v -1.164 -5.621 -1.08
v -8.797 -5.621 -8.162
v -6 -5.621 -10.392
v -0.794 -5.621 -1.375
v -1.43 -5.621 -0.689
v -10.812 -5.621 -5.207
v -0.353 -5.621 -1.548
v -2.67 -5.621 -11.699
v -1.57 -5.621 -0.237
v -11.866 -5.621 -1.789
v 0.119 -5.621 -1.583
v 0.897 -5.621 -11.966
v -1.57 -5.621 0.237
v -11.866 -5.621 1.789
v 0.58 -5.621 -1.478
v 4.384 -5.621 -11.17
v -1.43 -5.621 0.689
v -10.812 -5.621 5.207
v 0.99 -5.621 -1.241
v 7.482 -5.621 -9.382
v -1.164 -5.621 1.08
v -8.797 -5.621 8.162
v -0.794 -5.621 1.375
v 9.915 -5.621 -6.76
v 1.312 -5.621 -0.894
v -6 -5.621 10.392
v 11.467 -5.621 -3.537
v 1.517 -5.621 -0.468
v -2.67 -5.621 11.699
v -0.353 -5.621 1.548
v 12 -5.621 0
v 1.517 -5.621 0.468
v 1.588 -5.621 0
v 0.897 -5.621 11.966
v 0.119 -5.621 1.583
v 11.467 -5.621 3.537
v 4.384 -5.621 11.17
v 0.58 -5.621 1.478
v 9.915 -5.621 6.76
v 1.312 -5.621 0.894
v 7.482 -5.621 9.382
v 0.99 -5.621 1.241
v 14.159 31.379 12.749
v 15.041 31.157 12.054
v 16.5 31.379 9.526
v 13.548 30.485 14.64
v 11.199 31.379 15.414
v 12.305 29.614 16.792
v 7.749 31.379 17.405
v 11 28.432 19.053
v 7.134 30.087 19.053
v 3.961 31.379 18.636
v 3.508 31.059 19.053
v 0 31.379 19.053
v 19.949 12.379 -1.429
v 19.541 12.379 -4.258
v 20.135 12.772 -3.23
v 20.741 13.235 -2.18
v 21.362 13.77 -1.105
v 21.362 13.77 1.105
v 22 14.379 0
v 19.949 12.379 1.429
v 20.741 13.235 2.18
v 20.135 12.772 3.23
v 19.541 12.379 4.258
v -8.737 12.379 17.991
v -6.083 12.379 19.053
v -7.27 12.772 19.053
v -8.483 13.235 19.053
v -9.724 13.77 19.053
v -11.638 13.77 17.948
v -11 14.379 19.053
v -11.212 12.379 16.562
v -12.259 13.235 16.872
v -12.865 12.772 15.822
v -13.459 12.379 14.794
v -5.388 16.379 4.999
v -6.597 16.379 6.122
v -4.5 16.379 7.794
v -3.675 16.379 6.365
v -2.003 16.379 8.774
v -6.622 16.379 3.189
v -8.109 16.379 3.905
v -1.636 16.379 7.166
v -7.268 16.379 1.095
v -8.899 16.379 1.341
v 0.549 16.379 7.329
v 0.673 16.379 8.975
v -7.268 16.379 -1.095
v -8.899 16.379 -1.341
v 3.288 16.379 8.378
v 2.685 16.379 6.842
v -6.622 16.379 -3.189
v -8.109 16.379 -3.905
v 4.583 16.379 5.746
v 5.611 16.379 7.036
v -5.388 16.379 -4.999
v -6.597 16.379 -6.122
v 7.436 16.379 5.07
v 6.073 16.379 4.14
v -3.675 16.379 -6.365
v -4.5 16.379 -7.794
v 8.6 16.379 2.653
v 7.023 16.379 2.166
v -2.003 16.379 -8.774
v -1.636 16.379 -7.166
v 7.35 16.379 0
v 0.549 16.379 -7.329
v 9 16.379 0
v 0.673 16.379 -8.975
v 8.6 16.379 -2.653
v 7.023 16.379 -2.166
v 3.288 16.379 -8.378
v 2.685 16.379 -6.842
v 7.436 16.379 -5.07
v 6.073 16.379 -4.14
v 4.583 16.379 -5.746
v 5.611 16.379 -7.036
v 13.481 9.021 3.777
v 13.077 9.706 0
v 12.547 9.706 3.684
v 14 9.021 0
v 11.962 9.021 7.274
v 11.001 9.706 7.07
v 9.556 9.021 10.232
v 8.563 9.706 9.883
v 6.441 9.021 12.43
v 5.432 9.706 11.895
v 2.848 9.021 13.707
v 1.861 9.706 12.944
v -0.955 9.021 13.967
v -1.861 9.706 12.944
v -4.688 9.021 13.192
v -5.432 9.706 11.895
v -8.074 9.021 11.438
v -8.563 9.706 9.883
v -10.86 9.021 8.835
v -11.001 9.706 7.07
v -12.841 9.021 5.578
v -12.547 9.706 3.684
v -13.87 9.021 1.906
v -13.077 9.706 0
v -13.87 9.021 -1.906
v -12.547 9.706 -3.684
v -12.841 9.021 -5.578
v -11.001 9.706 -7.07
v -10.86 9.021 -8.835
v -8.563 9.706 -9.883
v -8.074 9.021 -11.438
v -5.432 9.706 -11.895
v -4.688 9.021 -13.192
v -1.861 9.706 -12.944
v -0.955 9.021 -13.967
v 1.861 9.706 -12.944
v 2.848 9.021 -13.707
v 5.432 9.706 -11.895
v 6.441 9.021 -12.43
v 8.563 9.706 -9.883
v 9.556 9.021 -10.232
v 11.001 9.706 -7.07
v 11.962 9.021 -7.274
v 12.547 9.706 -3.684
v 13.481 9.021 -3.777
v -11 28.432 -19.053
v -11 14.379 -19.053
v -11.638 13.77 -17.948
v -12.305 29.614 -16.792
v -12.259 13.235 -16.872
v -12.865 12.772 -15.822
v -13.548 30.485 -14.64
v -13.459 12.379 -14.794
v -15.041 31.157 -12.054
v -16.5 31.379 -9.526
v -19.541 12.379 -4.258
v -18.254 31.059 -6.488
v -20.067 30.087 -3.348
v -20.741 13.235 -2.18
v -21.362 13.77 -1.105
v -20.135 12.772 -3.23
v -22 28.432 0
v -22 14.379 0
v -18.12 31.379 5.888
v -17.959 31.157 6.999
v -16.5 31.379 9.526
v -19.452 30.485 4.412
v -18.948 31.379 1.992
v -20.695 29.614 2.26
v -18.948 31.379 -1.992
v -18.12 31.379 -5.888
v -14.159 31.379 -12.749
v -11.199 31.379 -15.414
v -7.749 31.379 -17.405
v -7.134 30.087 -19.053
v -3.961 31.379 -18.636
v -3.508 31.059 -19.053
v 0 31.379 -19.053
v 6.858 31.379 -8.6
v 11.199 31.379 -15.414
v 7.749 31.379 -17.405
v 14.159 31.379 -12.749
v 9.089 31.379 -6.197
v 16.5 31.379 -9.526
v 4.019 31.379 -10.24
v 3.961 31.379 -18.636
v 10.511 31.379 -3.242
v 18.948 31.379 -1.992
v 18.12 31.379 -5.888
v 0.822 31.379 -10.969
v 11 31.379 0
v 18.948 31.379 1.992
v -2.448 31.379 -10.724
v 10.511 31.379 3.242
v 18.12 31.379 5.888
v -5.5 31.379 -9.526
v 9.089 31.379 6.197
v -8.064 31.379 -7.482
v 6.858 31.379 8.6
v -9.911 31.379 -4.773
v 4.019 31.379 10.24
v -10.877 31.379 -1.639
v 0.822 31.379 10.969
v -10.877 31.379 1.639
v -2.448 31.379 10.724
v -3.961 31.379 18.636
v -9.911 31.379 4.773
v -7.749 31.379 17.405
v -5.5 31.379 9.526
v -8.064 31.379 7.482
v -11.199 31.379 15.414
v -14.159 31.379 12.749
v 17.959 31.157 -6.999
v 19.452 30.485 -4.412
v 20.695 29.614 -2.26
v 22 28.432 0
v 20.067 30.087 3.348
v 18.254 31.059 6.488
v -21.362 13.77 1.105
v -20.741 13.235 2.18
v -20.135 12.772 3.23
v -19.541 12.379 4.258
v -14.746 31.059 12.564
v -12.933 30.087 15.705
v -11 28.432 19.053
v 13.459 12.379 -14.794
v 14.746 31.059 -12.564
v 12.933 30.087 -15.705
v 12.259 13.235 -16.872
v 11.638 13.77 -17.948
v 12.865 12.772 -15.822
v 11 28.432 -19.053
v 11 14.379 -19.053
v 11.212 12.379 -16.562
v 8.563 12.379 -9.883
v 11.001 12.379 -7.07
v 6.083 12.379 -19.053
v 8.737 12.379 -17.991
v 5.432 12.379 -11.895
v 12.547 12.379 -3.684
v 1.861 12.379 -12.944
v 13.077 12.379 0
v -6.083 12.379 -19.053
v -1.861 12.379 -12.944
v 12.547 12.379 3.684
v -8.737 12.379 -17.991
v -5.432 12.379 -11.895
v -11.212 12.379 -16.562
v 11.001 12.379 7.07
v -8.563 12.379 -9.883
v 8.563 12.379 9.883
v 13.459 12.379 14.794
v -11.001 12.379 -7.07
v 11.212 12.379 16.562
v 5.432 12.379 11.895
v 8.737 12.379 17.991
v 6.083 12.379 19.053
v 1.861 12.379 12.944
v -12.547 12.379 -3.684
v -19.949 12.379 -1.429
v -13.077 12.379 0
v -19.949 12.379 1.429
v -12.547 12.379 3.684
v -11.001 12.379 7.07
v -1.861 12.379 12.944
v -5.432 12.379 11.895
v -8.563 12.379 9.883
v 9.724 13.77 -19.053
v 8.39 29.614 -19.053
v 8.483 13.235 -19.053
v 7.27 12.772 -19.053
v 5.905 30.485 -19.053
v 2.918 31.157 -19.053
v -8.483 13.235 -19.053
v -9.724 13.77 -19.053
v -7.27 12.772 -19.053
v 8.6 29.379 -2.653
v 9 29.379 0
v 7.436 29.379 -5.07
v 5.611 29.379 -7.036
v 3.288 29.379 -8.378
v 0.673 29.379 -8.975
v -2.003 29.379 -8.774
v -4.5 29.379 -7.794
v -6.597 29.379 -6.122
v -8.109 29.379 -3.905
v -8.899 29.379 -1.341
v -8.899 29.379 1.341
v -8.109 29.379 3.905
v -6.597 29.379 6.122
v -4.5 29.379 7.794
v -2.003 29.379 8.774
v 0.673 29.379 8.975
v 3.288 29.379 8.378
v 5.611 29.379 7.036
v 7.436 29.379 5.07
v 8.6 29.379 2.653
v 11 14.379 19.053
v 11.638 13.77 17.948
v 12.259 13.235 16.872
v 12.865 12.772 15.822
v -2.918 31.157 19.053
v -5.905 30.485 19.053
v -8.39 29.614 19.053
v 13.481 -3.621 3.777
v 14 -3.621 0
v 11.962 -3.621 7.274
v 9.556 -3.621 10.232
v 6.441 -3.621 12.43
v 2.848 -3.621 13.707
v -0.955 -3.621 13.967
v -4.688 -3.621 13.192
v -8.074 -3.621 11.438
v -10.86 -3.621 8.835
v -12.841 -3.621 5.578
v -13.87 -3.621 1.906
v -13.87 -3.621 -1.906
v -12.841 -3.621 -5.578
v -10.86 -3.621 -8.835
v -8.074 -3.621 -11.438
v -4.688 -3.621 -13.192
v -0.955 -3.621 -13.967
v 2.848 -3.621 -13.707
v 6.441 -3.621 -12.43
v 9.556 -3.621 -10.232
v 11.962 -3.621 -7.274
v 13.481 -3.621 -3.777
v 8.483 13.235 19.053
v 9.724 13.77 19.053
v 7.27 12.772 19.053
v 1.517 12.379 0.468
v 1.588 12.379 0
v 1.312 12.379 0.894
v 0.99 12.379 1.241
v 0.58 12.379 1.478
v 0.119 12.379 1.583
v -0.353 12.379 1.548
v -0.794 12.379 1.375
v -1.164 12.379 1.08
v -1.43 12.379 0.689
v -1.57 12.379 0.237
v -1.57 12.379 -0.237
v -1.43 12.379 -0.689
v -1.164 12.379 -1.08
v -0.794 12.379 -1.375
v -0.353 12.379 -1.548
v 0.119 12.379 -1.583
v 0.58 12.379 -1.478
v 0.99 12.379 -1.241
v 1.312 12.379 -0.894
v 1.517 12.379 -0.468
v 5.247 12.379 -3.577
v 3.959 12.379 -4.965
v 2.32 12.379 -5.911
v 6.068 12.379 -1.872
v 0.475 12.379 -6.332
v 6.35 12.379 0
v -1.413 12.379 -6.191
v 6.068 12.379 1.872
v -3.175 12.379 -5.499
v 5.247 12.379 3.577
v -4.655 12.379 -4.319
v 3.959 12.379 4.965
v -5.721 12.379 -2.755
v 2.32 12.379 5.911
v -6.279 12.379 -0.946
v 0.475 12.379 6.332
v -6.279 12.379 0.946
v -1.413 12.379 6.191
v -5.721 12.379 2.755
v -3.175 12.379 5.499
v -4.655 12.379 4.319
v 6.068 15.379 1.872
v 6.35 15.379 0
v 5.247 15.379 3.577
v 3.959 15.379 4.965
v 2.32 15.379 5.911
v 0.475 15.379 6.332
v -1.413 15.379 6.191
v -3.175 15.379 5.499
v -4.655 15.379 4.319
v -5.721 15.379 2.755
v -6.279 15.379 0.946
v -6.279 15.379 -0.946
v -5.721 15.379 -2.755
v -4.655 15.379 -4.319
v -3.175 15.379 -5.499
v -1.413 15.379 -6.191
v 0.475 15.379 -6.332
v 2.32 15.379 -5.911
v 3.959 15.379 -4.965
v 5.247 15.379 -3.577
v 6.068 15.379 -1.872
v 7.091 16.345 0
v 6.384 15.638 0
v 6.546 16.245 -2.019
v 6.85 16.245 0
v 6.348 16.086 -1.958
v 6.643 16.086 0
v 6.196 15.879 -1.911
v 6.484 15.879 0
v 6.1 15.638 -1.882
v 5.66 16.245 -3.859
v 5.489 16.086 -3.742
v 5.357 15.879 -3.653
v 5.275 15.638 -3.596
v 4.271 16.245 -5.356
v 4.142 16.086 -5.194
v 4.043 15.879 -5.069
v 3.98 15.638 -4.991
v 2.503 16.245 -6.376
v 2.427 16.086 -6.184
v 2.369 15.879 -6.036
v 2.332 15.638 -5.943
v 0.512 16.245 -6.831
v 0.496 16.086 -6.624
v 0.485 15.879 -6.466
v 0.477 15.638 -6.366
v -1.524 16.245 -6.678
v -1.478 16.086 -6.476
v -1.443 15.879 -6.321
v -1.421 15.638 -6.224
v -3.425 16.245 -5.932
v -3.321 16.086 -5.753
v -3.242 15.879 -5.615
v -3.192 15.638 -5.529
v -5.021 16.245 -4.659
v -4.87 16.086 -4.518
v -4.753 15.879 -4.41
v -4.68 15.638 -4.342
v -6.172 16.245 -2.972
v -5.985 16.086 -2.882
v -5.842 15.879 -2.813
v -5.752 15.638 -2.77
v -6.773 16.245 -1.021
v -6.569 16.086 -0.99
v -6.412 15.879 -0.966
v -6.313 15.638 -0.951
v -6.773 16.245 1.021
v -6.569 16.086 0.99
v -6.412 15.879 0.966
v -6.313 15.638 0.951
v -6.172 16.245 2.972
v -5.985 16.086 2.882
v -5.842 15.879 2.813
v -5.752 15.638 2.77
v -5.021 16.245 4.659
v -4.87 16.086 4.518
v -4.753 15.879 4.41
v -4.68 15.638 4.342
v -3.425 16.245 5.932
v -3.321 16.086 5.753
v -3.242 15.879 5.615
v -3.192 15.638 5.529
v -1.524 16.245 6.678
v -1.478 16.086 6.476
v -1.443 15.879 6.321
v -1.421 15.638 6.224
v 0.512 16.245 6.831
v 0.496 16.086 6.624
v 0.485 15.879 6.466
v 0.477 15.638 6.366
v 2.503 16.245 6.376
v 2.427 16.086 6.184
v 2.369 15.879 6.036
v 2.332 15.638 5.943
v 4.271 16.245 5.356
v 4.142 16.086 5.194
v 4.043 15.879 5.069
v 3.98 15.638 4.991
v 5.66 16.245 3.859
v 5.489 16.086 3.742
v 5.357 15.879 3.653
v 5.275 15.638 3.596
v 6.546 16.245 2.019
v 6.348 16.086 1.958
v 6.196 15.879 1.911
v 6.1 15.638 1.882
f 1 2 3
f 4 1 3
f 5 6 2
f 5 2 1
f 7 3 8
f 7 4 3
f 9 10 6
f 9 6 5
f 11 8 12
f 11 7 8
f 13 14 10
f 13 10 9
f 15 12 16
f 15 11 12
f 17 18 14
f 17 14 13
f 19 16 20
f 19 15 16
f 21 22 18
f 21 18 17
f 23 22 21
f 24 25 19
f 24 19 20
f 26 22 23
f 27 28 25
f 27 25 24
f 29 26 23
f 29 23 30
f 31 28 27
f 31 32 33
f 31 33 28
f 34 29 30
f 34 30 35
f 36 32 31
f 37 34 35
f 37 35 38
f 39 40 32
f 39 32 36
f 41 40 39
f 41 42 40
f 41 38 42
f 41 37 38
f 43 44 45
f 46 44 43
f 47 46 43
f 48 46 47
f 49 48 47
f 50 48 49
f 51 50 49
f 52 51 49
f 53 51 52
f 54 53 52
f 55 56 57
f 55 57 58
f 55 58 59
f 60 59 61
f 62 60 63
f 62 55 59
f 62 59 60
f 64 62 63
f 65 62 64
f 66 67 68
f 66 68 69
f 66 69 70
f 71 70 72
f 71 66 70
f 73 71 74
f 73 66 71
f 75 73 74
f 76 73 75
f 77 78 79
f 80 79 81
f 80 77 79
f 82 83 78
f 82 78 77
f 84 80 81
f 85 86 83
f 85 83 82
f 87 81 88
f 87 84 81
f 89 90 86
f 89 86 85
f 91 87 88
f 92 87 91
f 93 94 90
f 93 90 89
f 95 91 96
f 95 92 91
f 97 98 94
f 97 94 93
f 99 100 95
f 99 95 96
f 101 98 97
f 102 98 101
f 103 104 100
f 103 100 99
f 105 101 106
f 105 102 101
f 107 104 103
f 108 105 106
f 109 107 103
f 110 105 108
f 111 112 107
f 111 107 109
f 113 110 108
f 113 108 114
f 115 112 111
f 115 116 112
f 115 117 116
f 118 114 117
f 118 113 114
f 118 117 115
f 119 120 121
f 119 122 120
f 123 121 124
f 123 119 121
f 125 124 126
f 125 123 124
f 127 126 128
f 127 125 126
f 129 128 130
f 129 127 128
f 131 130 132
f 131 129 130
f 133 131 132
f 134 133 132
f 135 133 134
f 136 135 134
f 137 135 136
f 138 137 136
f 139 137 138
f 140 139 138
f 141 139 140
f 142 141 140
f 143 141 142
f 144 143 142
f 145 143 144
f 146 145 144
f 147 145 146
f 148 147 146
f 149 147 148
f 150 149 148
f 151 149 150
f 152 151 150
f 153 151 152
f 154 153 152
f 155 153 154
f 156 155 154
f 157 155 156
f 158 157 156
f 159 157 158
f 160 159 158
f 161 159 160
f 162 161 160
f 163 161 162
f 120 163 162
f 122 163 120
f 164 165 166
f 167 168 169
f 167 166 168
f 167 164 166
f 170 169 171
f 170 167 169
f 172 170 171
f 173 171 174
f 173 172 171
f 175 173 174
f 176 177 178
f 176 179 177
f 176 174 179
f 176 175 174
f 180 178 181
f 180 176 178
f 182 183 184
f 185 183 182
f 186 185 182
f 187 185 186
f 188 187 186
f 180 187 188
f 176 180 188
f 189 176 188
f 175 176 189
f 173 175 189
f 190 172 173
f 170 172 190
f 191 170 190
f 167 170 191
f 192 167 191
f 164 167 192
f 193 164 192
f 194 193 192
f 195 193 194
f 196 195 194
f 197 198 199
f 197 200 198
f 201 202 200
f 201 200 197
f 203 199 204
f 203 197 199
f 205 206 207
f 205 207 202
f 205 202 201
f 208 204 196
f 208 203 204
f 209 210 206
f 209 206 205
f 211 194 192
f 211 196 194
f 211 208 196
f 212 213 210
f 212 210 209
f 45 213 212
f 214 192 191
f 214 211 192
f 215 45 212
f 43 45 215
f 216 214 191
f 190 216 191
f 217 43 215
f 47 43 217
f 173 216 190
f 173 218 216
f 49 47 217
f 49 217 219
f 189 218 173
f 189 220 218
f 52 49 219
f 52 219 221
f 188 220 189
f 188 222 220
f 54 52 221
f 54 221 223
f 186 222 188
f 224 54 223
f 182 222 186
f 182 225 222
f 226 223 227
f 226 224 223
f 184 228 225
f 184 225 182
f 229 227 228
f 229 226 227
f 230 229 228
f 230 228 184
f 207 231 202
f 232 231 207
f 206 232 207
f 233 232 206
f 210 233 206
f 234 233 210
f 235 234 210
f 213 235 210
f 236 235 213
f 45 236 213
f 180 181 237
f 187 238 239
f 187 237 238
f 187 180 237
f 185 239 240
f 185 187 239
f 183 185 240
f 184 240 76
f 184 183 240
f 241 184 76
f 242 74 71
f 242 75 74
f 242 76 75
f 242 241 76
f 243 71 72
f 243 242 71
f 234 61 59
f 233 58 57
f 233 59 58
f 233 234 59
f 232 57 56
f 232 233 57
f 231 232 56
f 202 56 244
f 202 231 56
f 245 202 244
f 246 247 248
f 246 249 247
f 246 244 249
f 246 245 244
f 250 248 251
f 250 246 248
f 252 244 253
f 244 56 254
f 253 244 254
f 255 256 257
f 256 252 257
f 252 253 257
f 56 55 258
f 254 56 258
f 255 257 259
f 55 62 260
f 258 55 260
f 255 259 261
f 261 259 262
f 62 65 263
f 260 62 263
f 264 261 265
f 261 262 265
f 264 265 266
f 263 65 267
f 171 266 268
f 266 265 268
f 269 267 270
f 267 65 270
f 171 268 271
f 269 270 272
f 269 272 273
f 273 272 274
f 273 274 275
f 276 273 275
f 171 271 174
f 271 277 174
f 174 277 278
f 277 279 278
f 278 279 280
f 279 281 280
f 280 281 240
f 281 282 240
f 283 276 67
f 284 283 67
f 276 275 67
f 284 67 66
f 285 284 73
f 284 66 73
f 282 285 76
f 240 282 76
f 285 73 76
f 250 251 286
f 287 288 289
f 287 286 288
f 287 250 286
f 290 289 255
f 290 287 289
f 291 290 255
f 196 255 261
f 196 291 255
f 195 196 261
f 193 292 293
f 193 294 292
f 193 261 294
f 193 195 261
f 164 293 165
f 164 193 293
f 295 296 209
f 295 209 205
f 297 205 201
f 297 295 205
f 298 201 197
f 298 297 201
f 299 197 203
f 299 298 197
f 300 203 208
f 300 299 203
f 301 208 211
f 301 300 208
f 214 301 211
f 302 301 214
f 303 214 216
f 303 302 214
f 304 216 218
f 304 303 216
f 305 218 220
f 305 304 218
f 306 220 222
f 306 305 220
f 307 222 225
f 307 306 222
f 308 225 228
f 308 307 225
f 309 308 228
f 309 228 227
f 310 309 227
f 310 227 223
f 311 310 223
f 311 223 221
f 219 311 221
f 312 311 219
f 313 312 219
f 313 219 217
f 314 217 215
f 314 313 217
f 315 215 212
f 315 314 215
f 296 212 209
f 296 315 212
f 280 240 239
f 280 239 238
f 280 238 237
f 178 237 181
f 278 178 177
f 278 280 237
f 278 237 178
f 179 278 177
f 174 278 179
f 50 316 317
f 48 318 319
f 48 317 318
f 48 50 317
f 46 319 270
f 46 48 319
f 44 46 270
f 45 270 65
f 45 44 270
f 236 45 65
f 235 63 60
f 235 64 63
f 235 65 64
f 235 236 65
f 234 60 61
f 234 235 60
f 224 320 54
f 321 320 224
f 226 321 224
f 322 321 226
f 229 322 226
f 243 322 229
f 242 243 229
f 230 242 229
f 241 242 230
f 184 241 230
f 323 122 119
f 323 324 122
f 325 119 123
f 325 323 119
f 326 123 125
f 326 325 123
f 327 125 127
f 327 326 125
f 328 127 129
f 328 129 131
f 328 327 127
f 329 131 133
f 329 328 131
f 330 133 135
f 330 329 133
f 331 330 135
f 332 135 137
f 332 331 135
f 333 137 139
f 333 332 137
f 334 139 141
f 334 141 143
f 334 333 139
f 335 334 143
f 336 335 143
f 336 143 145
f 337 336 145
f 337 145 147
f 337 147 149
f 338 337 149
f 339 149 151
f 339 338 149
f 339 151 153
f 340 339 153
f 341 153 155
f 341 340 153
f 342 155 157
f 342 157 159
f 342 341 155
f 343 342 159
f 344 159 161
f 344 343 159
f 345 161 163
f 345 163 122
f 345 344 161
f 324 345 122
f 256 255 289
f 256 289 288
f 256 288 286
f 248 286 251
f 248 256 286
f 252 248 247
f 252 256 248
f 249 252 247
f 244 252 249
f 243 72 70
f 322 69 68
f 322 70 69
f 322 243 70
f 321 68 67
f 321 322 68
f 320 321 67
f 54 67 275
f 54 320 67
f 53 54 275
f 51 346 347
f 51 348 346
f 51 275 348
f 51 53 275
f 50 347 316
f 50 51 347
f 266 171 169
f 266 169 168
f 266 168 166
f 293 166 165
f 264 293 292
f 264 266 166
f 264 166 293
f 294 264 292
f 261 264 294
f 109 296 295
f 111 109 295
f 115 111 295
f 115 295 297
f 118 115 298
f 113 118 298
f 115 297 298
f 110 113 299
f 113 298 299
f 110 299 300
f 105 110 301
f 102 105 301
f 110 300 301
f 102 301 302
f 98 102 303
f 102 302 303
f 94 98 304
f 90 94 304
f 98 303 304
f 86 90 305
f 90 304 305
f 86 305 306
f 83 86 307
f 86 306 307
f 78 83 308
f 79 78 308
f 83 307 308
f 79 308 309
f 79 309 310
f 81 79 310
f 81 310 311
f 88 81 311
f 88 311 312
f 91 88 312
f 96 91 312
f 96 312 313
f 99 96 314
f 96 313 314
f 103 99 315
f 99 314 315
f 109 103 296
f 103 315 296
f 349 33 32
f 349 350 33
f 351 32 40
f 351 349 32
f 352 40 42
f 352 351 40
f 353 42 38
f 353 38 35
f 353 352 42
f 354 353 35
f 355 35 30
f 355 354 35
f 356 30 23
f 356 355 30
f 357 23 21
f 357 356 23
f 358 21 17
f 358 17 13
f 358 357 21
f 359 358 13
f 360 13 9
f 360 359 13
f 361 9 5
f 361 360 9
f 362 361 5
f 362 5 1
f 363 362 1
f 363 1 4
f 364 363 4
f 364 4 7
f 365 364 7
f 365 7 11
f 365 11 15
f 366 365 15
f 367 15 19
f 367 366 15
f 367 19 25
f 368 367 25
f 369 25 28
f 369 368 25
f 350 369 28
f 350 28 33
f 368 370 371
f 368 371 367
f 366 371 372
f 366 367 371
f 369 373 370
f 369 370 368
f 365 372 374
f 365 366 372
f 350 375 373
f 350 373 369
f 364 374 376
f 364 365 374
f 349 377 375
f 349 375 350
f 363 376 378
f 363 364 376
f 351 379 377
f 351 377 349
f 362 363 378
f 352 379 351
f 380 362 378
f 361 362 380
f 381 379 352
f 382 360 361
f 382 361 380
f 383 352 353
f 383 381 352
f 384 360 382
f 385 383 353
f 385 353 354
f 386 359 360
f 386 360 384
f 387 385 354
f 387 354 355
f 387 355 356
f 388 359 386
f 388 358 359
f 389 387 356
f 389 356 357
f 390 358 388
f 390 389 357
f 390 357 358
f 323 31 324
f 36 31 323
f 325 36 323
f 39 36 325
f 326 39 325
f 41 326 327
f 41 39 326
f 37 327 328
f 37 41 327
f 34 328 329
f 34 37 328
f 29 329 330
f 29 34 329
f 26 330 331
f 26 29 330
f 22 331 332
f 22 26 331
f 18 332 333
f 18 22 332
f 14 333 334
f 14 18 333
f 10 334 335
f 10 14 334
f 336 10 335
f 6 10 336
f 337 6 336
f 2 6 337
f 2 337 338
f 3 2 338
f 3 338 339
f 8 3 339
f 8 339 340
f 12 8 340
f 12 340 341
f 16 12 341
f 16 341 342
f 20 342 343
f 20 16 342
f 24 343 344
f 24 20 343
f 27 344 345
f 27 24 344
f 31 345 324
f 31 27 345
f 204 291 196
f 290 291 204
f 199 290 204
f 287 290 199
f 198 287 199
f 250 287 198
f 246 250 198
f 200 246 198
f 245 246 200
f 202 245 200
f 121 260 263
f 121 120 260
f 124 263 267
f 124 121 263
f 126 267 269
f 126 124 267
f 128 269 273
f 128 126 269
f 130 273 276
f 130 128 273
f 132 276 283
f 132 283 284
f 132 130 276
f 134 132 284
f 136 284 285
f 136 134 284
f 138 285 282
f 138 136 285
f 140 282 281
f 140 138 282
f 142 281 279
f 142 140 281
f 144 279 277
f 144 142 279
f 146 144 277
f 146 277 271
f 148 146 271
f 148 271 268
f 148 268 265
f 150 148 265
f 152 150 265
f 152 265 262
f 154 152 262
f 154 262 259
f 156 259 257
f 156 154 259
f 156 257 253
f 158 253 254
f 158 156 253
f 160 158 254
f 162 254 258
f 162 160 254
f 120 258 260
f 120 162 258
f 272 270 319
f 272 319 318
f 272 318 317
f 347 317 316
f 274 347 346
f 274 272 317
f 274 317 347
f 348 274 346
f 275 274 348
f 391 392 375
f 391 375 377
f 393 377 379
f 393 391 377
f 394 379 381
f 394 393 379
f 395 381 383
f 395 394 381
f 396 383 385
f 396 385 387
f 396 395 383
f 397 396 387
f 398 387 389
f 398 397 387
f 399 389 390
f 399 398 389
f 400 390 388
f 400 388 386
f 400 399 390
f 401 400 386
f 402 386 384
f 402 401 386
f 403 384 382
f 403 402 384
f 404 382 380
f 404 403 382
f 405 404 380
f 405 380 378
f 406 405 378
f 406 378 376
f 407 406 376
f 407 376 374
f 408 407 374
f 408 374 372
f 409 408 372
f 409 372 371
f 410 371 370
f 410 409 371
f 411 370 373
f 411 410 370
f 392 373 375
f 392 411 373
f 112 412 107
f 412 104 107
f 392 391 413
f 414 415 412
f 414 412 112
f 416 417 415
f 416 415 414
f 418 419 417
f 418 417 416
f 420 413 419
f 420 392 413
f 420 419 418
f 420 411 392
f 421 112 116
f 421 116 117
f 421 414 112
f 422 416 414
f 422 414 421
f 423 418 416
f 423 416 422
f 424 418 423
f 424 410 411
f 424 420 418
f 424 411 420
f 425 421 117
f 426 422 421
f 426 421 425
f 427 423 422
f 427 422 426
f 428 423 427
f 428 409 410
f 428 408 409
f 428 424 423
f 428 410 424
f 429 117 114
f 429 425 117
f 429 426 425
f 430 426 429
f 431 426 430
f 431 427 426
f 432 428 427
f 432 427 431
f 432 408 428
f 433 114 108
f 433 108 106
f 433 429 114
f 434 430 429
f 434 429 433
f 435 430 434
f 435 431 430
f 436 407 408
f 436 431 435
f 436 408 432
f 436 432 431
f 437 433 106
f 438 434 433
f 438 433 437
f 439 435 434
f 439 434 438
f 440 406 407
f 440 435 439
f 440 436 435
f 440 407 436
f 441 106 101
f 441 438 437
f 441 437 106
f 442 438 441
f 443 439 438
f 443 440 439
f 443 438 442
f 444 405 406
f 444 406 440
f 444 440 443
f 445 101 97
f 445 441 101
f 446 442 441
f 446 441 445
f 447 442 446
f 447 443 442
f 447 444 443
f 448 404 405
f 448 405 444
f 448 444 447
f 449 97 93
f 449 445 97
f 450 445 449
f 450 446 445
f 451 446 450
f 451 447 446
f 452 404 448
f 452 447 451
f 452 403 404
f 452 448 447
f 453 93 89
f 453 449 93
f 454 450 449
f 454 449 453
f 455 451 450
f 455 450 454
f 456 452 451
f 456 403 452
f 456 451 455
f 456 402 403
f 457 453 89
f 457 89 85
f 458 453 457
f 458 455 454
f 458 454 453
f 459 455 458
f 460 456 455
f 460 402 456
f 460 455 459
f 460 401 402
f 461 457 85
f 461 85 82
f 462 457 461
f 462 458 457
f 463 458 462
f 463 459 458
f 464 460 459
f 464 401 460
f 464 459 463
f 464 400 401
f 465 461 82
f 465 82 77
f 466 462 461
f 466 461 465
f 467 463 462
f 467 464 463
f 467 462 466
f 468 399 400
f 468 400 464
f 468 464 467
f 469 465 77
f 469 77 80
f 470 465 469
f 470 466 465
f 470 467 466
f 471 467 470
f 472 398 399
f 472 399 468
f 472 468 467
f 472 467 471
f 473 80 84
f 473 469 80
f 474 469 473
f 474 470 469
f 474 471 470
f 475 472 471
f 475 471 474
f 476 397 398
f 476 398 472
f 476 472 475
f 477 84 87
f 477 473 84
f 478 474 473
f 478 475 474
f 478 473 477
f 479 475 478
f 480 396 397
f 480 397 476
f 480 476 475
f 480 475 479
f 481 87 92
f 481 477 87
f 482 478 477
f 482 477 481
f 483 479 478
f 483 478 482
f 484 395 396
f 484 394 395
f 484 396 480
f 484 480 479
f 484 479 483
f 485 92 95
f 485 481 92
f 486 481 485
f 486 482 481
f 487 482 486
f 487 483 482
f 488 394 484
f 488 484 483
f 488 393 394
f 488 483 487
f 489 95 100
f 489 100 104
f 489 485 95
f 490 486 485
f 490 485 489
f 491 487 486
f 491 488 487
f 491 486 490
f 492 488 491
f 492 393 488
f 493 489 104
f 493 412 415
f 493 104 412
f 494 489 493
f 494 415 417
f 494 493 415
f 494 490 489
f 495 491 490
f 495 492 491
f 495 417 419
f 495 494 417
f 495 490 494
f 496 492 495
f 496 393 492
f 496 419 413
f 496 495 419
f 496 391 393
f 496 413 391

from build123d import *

# Parameters (mm, degrees)
CROQUIS4_OUTSIDE_W    = 60.478
CROQUIS4_OUTSIDE_H    = 60.478
CORTAR_EXTRUIR6_DEPTH = 70
CROQUIS5_OUTSIDE_W    = 199.794
CROQUIS5_OUTSIDE_H    = 193.9
CROQUIS5_OUTSIDE_R    = 19.052558883
CORTAR_EXTRUIR7_DEPTH = 70
CORTAR_EXTRUIR7_TAPER = 45
CROQUIS6_R            = 9
CORTAR_EXTRUIR8_DEPTH = 15
CHAFL_N1_SIZE         = 2
REDONDEO1_R           = 1


with BuildPart() as part:
    # Croquis1 → Revolución1 (revolve)
    with BuildSketch(Plane.XY):
        Polygon((6.35, 31.379194031), (20, 31.379194031), (22, 29.379194031), (22, 14.379194031), (20, 12.379194031), (14, 12.379194031), (13.076641816, 12.379194031), (13.076641816, 9.706334079), (14, 9.020543495), (14, -3.620805969), (12, -5.620805969), (1.5875, -5.620805969), (1.5875, 12.379194031), (6.35, 12.379194031), align=None)
    revolve(axis=Axis((0, 51.930492424, 0), (0, -1, 0)))

    # Croquis4 outside → Cortar-Extruir6 (cut)
    with BuildSketch(Plane(origin=(0, 31.379194031, 0), x_dir=(1, 0, 0), z_dir=(0, 1, 0))):
        Rectangle(CROQUIS4_OUTSIDE_W, CROQUIS4_OUTSIDE_H)
        Polygon((22, 0), (11, 19.052558883), (-11, 19.052558883), (-22, 0), (-11, -19.052558883), (11, -19.052558883), align=None, mode=Mode.SUBTRACT)
    extrude(amount=-CORTAR_EXTRUIR6_DEPTH, mode=Mode.SUBTRACT)

    # Croquis5 outside → Cortar-Extruir7 (cut)
    with BuildSketch(Plane(origin=(0, 31.379194031, 0), x_dir=(1, 0, 0), z_dir=(0, 1, 0))):
        Rectangle(CROQUIS5_OUTSIDE_W, CROQUIS5_OUTSIDE_H)
        Circle(CROQUIS5_OUTSIDE_R, mode=Mode.SUBTRACT)
    extrude(amount=-CORTAR_EXTRUIR7_DEPTH, taper=CORTAR_EXTRUIR7_TAPER, mode=Mode.SUBTRACT)

    # Croquis6 → Cortar-Extruir8 (cut)
    with BuildSketch(Plane(origin=(0, 31.379194031, 0), x_dir=(1, 0, 0), z_dir=(0, 1, 0))):
        Circle(CROQUIS6_R)
    extrude(amount=-CORTAR_EXTRUIR8_DEPTH, mode=Mode.SUBTRACT)

    # Chaflán1
    chafl_n1_edges = [part.edges().sort_by_distance(p)[0] for p in [
        (-9, 31.379194031, 0),
    ]]
    chamfer(chafl_n1_edges, length=CHAFL_N1_SIZE)

    # Redondeo1
    redondeo1_edges = [part.edges().sort_by_distance(p)[0] for p in [
        (-6.35, 16.379194031, 0),
    ]]
    fillet(redondeo1_edges, radius=REDONDEO1_R)


solid = part.part
